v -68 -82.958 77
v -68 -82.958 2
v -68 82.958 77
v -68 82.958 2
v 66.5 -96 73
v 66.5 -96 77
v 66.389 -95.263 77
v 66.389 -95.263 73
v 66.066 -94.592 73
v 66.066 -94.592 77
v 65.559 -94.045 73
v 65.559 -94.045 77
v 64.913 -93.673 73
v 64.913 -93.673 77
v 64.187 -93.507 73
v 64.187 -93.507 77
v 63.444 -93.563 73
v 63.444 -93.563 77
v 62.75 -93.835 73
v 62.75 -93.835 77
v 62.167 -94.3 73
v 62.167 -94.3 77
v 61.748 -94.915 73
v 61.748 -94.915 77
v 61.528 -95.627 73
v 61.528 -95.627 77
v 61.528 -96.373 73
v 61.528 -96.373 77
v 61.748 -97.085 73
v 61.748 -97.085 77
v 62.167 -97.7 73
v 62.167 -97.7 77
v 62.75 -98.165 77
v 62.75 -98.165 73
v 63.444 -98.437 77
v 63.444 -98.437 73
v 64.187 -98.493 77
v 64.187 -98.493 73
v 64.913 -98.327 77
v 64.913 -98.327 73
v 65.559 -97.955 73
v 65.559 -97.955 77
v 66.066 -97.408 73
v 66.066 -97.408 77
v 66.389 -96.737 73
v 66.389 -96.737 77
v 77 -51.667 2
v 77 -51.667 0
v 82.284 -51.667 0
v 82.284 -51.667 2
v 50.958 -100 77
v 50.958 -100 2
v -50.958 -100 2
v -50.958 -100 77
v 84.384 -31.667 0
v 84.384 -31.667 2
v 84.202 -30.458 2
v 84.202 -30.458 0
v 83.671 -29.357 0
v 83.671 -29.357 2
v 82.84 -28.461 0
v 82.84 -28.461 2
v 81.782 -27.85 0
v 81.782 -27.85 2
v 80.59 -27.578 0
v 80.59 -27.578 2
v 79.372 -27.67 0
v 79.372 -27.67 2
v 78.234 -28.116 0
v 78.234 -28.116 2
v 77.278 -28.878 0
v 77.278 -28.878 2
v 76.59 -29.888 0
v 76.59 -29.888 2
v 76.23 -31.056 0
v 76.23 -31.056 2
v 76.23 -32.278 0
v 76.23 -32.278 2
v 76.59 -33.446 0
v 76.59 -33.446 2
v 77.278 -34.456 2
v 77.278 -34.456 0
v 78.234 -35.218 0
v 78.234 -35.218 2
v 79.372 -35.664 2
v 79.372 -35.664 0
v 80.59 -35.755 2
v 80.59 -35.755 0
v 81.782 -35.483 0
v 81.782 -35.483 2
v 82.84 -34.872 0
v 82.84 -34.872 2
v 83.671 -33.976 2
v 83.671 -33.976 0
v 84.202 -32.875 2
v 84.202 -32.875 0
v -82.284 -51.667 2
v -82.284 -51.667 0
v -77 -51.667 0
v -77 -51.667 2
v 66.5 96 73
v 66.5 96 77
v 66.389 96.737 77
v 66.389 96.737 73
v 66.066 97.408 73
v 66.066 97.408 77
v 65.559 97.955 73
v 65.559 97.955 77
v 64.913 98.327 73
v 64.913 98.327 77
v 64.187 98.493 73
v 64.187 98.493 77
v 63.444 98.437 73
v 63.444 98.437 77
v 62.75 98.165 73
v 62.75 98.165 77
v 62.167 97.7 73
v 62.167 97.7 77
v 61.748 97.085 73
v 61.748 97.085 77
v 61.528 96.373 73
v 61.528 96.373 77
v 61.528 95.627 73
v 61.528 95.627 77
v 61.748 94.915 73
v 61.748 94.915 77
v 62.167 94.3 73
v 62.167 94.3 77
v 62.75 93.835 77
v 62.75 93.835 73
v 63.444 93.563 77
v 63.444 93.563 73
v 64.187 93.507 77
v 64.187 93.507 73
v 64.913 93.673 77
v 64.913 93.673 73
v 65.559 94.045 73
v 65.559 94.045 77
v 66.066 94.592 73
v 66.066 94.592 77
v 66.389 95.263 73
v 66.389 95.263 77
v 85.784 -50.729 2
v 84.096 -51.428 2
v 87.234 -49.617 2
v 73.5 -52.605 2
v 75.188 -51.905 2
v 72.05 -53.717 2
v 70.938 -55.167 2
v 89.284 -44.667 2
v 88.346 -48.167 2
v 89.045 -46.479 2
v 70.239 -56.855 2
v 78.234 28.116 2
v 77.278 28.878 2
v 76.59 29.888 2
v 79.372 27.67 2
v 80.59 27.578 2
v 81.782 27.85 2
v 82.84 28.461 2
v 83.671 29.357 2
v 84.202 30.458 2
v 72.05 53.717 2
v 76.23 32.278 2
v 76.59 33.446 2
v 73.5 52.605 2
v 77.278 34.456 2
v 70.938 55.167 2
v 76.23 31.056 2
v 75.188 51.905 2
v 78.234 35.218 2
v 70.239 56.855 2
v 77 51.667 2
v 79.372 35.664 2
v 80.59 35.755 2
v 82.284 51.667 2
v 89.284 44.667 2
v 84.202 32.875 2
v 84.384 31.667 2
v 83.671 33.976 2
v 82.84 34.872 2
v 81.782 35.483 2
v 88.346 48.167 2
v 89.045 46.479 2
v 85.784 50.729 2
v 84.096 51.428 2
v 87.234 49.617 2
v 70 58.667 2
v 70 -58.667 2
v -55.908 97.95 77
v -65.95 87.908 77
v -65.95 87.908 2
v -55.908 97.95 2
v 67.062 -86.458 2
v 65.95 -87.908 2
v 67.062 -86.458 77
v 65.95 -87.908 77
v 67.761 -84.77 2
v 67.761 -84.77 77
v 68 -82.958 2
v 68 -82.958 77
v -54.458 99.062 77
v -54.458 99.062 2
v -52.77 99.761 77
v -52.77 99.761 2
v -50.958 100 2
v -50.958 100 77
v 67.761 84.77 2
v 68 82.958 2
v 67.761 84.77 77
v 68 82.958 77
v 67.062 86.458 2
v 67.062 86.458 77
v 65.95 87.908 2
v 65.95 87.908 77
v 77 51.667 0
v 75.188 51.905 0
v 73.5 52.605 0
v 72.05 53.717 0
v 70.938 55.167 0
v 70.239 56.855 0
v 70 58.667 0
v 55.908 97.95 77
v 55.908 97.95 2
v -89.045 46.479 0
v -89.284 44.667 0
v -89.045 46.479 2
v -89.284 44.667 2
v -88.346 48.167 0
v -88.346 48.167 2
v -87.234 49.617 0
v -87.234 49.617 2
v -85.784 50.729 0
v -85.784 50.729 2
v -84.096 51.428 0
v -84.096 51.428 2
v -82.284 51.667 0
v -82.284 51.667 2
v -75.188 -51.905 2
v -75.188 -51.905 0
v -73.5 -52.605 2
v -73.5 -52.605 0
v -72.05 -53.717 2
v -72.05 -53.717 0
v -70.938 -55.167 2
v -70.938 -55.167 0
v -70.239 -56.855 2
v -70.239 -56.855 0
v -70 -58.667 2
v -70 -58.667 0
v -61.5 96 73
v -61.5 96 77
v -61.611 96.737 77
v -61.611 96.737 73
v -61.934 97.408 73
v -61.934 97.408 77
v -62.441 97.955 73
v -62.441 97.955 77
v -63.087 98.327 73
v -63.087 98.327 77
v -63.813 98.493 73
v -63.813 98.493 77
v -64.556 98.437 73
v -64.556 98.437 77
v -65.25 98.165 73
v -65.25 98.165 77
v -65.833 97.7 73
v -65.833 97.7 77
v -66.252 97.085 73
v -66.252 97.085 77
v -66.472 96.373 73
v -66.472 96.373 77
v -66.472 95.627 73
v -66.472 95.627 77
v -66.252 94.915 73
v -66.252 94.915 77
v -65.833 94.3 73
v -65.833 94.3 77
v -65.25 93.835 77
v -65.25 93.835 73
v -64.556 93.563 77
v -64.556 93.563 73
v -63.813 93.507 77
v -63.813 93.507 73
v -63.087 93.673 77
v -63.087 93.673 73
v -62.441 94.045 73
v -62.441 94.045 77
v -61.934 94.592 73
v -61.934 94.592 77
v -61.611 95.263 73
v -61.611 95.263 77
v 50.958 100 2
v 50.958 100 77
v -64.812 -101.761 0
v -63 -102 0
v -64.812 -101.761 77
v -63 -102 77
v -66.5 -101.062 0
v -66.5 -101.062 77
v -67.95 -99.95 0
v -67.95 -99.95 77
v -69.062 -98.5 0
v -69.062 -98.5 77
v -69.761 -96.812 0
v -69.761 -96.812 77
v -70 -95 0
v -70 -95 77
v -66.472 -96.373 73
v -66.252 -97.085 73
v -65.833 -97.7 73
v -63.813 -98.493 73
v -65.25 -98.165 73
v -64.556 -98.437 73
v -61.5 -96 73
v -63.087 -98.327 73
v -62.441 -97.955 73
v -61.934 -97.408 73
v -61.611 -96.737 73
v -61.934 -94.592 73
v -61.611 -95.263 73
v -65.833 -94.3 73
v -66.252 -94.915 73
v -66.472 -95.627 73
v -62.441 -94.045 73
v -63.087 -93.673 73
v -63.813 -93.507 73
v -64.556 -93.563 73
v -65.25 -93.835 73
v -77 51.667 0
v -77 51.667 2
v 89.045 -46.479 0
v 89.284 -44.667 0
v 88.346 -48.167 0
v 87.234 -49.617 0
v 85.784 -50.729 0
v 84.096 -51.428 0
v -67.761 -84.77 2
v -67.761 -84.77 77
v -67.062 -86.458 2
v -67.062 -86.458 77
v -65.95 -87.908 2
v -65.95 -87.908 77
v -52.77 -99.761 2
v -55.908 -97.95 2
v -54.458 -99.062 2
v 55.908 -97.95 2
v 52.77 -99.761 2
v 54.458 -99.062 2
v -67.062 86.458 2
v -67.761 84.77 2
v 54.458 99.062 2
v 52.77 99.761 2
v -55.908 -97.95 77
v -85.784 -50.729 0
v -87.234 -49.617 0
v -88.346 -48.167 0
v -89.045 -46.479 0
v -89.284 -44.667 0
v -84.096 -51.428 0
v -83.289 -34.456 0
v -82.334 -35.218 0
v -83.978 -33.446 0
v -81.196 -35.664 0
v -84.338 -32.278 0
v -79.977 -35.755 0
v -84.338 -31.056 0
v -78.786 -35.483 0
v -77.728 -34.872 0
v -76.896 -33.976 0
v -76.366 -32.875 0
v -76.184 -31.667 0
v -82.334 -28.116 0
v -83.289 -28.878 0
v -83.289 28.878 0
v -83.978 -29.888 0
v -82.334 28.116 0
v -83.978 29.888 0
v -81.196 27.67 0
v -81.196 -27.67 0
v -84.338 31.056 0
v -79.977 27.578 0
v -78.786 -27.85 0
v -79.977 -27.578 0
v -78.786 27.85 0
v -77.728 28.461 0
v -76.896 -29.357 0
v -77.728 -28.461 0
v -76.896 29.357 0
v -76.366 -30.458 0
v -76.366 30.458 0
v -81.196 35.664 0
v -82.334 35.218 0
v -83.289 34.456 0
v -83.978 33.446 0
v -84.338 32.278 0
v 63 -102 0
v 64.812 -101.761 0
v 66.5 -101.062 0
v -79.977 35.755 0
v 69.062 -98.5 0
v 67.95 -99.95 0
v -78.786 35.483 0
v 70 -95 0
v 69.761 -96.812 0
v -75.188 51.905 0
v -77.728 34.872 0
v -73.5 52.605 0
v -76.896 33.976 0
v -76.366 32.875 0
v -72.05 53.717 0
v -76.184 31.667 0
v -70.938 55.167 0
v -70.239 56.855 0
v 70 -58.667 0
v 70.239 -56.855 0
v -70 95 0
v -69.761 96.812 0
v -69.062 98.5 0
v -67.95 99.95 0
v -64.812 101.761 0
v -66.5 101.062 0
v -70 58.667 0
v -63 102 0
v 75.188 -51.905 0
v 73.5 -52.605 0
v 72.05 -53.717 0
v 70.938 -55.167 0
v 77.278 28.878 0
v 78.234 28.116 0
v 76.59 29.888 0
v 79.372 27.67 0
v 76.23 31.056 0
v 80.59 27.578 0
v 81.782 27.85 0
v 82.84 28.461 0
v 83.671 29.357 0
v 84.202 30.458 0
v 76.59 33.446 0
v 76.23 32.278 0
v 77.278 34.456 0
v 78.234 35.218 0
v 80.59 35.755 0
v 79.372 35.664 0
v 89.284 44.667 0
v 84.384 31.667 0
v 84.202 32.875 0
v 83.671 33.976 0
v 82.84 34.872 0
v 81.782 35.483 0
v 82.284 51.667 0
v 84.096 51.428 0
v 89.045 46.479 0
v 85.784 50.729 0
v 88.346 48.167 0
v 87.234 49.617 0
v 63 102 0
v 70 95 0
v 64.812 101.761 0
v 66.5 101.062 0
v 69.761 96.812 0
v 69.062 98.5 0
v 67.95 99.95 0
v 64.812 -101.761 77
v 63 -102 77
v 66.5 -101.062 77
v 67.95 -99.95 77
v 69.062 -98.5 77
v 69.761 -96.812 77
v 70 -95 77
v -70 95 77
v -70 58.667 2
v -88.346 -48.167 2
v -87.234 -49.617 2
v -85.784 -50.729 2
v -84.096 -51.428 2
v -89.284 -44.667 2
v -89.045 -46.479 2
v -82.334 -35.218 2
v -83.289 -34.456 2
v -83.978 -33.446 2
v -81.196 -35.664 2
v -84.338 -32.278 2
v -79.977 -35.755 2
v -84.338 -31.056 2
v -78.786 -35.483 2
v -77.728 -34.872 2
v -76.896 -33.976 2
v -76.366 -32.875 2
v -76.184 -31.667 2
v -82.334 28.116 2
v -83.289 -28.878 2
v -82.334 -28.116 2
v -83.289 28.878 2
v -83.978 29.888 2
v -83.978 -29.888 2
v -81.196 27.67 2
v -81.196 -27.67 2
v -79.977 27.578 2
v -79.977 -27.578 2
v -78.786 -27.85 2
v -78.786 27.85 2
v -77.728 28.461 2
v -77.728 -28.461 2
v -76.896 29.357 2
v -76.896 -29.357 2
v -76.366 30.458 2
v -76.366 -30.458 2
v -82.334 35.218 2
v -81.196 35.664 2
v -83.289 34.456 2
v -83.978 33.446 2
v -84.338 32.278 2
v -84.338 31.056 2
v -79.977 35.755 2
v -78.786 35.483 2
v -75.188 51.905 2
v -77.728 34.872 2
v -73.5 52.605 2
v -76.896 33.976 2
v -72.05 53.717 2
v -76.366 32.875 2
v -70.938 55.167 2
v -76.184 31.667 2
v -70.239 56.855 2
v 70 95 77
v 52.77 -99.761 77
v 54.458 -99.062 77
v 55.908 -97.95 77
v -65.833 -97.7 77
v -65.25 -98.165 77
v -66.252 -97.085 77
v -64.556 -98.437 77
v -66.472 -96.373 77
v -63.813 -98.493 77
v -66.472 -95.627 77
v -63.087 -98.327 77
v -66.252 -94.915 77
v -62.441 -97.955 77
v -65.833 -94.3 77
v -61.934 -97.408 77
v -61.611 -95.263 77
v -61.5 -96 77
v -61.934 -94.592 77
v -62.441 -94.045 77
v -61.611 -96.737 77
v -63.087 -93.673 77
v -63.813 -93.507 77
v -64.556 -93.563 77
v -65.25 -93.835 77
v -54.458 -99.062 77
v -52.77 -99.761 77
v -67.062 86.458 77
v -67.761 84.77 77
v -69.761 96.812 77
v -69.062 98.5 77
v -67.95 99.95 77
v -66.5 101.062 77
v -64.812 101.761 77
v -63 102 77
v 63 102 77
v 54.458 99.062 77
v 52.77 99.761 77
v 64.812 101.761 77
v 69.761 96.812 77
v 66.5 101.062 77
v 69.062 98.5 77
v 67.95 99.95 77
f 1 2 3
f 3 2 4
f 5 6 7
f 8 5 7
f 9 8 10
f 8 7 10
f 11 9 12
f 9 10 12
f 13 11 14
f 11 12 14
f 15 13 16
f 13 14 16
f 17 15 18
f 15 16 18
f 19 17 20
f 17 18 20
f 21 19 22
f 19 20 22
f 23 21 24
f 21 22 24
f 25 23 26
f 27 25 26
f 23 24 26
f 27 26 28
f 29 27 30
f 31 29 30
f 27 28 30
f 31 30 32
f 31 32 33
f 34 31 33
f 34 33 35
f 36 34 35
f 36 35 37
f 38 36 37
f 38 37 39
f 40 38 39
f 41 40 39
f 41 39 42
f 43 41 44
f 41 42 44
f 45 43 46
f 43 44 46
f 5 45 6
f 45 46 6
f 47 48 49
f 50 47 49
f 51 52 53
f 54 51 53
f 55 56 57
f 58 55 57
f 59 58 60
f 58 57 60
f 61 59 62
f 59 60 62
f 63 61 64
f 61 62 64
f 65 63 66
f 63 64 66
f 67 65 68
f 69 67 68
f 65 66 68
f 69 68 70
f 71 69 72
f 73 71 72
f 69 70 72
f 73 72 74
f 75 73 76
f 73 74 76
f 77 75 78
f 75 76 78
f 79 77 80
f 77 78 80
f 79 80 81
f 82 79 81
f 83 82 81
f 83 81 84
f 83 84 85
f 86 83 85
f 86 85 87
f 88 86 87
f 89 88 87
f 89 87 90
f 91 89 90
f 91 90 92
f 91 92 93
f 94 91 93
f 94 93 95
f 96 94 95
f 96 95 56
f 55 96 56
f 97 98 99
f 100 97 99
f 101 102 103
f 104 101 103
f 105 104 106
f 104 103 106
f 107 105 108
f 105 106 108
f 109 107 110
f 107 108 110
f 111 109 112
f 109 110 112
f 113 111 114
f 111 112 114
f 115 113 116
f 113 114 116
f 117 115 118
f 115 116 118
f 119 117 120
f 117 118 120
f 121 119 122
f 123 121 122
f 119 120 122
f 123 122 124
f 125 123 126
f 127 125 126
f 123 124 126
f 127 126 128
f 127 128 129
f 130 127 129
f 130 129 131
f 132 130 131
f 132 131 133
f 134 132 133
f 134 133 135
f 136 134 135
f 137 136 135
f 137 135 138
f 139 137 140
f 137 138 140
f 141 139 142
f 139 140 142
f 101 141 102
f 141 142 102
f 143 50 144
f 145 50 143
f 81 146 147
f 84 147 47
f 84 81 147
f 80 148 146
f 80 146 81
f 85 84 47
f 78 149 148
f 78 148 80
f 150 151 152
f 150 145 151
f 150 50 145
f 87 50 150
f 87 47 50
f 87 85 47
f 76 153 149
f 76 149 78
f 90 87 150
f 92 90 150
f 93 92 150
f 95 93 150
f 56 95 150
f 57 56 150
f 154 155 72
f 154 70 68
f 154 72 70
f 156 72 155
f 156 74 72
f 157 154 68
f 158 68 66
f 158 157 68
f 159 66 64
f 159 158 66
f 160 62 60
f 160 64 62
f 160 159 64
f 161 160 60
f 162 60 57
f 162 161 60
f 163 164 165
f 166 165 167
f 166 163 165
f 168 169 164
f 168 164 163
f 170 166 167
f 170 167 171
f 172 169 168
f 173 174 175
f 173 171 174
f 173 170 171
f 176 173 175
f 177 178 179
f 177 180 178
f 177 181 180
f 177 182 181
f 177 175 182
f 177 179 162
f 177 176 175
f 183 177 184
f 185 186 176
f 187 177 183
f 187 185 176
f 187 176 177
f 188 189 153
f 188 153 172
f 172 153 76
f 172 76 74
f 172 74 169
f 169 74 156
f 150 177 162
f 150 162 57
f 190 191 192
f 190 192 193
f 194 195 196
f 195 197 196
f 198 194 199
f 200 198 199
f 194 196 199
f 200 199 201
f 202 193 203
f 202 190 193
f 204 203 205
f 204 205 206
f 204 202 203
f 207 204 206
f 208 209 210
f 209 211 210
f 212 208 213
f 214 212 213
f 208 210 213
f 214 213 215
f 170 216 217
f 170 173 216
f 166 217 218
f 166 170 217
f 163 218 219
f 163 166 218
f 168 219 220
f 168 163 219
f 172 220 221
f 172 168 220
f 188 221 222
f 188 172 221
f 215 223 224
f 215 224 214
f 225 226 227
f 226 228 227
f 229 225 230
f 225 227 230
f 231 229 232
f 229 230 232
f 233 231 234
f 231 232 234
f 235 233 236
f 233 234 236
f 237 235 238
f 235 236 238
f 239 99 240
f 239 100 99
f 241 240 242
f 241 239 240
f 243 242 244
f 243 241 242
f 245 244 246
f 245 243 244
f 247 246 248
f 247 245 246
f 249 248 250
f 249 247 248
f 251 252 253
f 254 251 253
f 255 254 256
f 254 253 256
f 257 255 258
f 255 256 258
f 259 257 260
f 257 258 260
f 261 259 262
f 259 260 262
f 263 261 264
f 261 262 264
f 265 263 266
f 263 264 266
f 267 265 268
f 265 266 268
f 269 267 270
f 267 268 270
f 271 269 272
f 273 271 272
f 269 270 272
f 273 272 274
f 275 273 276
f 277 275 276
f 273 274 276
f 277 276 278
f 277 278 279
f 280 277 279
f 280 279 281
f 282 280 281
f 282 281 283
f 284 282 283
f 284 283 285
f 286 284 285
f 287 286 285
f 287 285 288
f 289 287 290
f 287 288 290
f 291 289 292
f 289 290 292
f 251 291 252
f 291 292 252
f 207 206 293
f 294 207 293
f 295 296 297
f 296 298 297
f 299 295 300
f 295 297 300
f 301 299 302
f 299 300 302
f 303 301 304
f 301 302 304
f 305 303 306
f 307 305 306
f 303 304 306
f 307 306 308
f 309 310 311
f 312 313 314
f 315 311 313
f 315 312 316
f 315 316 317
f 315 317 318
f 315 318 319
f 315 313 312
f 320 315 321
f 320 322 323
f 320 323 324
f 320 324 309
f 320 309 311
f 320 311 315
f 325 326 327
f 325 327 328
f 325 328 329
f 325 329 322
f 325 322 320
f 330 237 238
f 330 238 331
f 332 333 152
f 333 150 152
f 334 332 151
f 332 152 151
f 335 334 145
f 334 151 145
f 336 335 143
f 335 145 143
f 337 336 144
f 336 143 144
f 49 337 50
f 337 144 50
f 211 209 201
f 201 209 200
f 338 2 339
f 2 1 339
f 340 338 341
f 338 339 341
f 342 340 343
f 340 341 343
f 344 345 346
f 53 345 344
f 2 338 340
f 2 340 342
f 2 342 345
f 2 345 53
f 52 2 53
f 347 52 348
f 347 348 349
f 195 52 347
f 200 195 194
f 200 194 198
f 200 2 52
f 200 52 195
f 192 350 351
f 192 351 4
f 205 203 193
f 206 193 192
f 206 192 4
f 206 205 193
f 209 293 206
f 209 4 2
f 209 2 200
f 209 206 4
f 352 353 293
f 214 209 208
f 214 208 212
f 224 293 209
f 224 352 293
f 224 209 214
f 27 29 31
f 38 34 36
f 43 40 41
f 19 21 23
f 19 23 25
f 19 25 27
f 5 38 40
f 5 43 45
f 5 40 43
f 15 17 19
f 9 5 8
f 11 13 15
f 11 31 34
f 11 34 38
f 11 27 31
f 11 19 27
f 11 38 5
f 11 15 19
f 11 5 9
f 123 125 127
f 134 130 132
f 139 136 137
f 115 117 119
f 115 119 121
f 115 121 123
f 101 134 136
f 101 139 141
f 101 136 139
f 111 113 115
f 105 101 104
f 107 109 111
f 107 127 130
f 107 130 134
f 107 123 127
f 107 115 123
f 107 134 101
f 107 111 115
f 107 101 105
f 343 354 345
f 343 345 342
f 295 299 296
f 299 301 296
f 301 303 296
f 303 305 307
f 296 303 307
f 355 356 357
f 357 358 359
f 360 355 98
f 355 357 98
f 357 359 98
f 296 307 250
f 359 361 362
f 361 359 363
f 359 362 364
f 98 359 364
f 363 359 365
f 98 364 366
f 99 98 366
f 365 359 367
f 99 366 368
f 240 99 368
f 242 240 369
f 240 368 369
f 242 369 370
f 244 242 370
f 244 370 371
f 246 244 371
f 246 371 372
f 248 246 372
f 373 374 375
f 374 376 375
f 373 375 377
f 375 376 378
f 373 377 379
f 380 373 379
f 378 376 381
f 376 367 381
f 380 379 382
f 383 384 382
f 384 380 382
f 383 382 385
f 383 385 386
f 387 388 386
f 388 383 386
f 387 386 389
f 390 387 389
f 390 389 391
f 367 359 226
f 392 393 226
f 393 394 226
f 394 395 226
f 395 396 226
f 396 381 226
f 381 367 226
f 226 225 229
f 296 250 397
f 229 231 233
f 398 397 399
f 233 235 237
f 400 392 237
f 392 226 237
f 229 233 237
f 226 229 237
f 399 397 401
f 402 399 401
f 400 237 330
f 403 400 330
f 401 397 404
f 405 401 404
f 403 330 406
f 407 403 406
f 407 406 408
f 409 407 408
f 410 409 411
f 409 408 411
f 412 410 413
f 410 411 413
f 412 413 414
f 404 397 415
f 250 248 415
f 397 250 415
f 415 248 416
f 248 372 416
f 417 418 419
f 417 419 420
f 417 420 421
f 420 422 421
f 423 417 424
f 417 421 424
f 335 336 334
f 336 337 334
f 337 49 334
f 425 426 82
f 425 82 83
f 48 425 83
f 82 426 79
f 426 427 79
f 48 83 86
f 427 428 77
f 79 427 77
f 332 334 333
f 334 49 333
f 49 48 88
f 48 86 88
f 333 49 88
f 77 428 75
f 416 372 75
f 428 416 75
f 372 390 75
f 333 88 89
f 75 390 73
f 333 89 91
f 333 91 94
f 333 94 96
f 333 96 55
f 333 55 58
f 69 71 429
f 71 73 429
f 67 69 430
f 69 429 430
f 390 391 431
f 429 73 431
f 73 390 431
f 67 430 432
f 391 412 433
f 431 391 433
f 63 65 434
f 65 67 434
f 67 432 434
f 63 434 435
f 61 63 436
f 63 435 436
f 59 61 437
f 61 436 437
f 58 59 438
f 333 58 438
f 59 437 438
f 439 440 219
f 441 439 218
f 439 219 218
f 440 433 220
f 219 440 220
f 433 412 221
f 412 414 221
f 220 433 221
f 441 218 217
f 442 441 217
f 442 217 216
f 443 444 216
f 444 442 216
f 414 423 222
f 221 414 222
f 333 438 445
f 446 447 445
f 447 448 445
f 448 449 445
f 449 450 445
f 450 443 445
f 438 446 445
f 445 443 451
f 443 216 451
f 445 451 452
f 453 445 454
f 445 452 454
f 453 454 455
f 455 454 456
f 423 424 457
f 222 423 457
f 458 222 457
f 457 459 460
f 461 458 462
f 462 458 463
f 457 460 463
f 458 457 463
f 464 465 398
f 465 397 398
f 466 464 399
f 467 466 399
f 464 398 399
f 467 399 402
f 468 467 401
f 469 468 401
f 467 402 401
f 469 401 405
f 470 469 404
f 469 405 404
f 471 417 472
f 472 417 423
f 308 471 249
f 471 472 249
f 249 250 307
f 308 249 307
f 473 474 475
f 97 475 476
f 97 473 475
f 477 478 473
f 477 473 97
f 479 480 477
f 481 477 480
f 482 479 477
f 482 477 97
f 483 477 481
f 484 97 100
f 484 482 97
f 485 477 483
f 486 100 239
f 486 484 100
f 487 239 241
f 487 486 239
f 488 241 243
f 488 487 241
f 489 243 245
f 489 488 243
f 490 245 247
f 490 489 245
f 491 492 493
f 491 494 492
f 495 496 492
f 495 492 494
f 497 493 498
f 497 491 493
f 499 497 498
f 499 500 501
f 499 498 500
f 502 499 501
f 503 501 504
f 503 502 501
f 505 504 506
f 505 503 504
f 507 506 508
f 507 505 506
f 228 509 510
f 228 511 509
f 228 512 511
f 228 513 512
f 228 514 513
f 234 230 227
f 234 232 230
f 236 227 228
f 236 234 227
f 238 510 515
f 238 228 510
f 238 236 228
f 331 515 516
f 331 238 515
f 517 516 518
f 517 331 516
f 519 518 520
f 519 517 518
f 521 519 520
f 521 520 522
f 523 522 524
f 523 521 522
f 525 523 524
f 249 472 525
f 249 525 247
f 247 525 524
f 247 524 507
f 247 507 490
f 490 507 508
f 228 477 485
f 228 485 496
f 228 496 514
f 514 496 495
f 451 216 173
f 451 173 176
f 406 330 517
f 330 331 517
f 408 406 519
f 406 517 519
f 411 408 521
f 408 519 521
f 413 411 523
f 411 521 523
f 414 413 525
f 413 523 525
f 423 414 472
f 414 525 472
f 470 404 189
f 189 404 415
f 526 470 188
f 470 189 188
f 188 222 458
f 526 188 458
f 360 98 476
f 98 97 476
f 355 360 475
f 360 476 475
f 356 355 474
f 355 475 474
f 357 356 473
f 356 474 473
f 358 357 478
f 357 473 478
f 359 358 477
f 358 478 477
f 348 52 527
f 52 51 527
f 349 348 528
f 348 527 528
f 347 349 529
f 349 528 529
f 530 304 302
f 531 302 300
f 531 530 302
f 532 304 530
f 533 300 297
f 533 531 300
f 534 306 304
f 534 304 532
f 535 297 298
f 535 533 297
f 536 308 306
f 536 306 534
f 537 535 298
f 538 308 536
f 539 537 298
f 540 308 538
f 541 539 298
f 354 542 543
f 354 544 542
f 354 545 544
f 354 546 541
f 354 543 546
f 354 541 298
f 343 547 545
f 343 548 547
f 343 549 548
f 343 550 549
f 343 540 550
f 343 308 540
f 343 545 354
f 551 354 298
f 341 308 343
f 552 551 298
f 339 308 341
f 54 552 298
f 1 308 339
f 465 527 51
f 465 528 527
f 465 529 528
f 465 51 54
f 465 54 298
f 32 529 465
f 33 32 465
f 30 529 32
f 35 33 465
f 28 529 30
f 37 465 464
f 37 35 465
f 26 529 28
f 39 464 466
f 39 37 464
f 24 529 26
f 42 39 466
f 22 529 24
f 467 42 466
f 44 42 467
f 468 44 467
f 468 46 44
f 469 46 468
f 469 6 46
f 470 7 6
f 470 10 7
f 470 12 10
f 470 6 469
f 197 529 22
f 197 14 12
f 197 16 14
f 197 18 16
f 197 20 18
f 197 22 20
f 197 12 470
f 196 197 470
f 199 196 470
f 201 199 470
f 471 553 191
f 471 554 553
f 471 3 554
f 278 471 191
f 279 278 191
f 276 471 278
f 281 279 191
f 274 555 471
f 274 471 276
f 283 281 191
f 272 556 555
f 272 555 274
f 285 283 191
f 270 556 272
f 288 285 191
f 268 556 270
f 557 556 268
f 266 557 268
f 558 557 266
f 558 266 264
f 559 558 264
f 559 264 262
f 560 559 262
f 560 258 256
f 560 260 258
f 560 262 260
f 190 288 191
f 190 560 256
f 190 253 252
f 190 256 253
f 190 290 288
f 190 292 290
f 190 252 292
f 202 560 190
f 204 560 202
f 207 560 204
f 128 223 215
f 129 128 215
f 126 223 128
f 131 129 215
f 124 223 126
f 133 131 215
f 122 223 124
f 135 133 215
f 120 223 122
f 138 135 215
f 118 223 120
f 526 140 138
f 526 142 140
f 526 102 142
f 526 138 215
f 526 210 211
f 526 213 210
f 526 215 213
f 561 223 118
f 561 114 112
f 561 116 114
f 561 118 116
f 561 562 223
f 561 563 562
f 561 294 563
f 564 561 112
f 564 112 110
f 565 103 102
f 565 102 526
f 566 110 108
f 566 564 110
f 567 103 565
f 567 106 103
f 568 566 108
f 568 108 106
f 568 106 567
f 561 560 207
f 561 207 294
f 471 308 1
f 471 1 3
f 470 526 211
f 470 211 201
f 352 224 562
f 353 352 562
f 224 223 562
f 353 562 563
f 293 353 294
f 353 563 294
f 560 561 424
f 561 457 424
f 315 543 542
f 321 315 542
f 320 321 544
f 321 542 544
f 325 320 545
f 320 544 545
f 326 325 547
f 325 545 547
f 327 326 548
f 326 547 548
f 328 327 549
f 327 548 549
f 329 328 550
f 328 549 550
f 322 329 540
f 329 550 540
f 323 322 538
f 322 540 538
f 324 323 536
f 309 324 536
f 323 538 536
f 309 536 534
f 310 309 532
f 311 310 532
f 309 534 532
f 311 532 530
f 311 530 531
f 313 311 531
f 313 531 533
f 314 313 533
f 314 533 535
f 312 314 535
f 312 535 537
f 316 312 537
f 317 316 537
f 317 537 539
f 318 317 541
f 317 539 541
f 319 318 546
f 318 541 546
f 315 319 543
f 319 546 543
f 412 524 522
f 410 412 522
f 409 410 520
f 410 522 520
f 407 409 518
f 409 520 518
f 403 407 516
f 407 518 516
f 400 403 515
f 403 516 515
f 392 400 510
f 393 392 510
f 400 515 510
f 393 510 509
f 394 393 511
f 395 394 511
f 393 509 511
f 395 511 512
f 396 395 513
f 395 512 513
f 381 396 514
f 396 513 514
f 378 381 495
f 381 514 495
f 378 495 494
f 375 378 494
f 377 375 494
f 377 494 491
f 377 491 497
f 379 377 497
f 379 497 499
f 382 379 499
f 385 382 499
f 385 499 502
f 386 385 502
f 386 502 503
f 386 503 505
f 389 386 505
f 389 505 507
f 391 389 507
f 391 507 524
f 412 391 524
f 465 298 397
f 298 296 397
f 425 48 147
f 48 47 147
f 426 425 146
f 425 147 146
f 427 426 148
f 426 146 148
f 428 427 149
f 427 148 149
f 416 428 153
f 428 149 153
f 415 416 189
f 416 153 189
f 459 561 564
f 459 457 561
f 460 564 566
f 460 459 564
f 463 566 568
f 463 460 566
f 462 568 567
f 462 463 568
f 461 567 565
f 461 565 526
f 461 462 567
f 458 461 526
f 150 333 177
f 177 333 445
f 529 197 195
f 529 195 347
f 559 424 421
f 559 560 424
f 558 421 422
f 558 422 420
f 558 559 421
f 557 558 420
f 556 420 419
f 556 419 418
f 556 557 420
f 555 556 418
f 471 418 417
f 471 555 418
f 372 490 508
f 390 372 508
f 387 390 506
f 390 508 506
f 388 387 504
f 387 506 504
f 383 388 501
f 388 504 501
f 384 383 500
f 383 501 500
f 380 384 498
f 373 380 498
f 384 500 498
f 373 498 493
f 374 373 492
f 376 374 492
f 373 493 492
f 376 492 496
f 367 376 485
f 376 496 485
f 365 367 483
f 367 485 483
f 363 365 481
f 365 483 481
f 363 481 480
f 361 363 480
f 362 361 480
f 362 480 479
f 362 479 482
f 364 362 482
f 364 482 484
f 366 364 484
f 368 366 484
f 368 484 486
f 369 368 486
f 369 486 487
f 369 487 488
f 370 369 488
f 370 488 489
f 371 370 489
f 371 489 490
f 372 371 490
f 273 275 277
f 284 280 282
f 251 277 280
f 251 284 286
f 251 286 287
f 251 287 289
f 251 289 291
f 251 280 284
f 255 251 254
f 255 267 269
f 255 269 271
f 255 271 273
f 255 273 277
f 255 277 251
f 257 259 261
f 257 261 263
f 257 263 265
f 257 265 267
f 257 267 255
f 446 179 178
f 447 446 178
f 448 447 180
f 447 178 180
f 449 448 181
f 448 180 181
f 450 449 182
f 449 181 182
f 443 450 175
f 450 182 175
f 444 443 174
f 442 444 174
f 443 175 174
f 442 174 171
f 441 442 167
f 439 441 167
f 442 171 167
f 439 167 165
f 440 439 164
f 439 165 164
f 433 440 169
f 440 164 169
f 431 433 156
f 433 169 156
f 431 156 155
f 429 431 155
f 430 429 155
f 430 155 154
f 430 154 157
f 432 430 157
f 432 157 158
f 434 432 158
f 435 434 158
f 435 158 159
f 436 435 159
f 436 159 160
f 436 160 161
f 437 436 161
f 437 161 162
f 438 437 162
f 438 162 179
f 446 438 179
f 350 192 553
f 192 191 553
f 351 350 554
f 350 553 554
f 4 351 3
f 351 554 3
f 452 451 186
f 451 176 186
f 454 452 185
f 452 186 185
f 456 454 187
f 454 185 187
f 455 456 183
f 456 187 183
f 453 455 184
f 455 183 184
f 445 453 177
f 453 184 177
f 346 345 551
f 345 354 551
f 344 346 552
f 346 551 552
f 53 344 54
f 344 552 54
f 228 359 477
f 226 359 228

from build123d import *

# Parameters (mm, degrees)
F0_W     = 140
F0_H     = 50.3332037926
F0_H_2   = 103.3335924149
F0_W_2   = 19.2838388681
F1_DEPTH = 2
F3_DEPTH = 75
F4_R     = 7
F5_R     = 2.5
F6_DEPTH = 4
F7_R     = 4.1
F8_DEPTH = 25


with BuildPart() as f1:
    # F0 (on Top) → F1 (new body)
    with BuildSketch(Plane.XY):
        with Locations((0, 76.8333981037)):
            Rectangle(F0_W, F0_H)
        Rectangle(F0_W, F0_H_2)
        with Locations((-79.6419194341, 0)):
            Rectangle(F0_W_2, F0_H_2)
        with Locations((0, -76.8333981037)):
            Rectangle(F0_W, F0_H)
        with Locations((79.6419194341, 0)):
            Rectangle(F0_W_2, F0_H_2)
    extrude(amount=F1_DEPTH)

    # F2 (on face) → F3 (join)
    with BuildSketch(Plane.XY.offset(2)):
        Polygon((70, 51.6667962074), (70, 102), (-70, 102), (-70, 51.6667962074), (-70, -51.6667962074), (-70, -102), (70, -102), (70, -51.6667962074), align=None)
        Polygon((53.8578643763, 100), (68, 100), (68, 85.8578643763), (68, -85.8578643763), (68, -100), (53.8578643763, -100), (-53.8578643763, -100), (-68, -100), (-68, -85.8578643763), (-68, 85.8578643763), (-68, 100), (-53.8578643763, 100), align=None, mode=Mode.SUBTRACT)
        Polygon((-68, 85.8578643763), (-53.8578643763, 100), (-68, 100), align=None)
        Polygon((68, 85.8578643763), (68, 100), (53.8578643763, 100), align=None)
        Polygon((68, -100), (68, -85.8578643763), (53.8578643763, -100), align=None)
        Polygon((-53.8578643763, -100), (-68, -85.8578643763), (-68, -100), align=None)
    extrude(amount=F3_DEPTH)

    # F4
    f4_edges = [f1.edges().sort_by_distance(p)[0] for p in [
        (70, -102, 38.5),
        (70, 102, 38.5),
        (-70, 102, 38.5),
        (-70, -102, 38.5),
        (-53.857864, -100, 39.5),
        (-68, -85.857864, 39.5),
        (53.857864, -100, 39.5),
        (68, -85.857864, 39.5),
        (-68, 85.857864, 39.5),
        (-53.857864, 100, 39.5),
        (53.857864, 100, 39.5),
        (68, 85.857864, 39.5),
        (-70, 51.666796, 1),
        (-89.283839, 51.666796, 1),
        (-89.283839, -51.666796, 1),
        (-70, -51.666796, 1),
        (70, -51.666796, 1),
        (89.283839, -51.666796, 1),
        (89.283839, 51.666796, 1),
        (70, 51.666796, 1),
    ]]
    fillet(f4_edges, radius=F4_R)

    # F5 (on face) → F6 (cut)
    with BuildSketch(Plane.XY.offset(77)):
        with Locations((-64, 96)):
            Circle(F5_R)
        with Locations((64, 96)):
            Circle(F5_R)
        with Locations((64, -96)):
            Circle(F5_R)
        with Locations((-64, -96)):
            Circle(F5_R)
    extrude(amount=-F6_DEPTH, mode=Mode.SUBTRACT)

    # F7 (on face) → F8 (cut)
    with BuildSketch(Plane.XY.offset(2)):
        with Locations((-80.2838388681, 31.6667962074)):
            Circle(F7_R)
        with Locations((-80.2838388681, -31.6667962074)):
            Circle(F7_R)
        with Locations((80.2838388681, -31.6667962074)):
            Circle(F7_R)
        with Locations((80.2838388681, 31.6667962074)):
            Circle(F7_R)
    extrude(amount=-F8_DEPTH, mode=Mode.SUBTRACT)


solid = f1.part
